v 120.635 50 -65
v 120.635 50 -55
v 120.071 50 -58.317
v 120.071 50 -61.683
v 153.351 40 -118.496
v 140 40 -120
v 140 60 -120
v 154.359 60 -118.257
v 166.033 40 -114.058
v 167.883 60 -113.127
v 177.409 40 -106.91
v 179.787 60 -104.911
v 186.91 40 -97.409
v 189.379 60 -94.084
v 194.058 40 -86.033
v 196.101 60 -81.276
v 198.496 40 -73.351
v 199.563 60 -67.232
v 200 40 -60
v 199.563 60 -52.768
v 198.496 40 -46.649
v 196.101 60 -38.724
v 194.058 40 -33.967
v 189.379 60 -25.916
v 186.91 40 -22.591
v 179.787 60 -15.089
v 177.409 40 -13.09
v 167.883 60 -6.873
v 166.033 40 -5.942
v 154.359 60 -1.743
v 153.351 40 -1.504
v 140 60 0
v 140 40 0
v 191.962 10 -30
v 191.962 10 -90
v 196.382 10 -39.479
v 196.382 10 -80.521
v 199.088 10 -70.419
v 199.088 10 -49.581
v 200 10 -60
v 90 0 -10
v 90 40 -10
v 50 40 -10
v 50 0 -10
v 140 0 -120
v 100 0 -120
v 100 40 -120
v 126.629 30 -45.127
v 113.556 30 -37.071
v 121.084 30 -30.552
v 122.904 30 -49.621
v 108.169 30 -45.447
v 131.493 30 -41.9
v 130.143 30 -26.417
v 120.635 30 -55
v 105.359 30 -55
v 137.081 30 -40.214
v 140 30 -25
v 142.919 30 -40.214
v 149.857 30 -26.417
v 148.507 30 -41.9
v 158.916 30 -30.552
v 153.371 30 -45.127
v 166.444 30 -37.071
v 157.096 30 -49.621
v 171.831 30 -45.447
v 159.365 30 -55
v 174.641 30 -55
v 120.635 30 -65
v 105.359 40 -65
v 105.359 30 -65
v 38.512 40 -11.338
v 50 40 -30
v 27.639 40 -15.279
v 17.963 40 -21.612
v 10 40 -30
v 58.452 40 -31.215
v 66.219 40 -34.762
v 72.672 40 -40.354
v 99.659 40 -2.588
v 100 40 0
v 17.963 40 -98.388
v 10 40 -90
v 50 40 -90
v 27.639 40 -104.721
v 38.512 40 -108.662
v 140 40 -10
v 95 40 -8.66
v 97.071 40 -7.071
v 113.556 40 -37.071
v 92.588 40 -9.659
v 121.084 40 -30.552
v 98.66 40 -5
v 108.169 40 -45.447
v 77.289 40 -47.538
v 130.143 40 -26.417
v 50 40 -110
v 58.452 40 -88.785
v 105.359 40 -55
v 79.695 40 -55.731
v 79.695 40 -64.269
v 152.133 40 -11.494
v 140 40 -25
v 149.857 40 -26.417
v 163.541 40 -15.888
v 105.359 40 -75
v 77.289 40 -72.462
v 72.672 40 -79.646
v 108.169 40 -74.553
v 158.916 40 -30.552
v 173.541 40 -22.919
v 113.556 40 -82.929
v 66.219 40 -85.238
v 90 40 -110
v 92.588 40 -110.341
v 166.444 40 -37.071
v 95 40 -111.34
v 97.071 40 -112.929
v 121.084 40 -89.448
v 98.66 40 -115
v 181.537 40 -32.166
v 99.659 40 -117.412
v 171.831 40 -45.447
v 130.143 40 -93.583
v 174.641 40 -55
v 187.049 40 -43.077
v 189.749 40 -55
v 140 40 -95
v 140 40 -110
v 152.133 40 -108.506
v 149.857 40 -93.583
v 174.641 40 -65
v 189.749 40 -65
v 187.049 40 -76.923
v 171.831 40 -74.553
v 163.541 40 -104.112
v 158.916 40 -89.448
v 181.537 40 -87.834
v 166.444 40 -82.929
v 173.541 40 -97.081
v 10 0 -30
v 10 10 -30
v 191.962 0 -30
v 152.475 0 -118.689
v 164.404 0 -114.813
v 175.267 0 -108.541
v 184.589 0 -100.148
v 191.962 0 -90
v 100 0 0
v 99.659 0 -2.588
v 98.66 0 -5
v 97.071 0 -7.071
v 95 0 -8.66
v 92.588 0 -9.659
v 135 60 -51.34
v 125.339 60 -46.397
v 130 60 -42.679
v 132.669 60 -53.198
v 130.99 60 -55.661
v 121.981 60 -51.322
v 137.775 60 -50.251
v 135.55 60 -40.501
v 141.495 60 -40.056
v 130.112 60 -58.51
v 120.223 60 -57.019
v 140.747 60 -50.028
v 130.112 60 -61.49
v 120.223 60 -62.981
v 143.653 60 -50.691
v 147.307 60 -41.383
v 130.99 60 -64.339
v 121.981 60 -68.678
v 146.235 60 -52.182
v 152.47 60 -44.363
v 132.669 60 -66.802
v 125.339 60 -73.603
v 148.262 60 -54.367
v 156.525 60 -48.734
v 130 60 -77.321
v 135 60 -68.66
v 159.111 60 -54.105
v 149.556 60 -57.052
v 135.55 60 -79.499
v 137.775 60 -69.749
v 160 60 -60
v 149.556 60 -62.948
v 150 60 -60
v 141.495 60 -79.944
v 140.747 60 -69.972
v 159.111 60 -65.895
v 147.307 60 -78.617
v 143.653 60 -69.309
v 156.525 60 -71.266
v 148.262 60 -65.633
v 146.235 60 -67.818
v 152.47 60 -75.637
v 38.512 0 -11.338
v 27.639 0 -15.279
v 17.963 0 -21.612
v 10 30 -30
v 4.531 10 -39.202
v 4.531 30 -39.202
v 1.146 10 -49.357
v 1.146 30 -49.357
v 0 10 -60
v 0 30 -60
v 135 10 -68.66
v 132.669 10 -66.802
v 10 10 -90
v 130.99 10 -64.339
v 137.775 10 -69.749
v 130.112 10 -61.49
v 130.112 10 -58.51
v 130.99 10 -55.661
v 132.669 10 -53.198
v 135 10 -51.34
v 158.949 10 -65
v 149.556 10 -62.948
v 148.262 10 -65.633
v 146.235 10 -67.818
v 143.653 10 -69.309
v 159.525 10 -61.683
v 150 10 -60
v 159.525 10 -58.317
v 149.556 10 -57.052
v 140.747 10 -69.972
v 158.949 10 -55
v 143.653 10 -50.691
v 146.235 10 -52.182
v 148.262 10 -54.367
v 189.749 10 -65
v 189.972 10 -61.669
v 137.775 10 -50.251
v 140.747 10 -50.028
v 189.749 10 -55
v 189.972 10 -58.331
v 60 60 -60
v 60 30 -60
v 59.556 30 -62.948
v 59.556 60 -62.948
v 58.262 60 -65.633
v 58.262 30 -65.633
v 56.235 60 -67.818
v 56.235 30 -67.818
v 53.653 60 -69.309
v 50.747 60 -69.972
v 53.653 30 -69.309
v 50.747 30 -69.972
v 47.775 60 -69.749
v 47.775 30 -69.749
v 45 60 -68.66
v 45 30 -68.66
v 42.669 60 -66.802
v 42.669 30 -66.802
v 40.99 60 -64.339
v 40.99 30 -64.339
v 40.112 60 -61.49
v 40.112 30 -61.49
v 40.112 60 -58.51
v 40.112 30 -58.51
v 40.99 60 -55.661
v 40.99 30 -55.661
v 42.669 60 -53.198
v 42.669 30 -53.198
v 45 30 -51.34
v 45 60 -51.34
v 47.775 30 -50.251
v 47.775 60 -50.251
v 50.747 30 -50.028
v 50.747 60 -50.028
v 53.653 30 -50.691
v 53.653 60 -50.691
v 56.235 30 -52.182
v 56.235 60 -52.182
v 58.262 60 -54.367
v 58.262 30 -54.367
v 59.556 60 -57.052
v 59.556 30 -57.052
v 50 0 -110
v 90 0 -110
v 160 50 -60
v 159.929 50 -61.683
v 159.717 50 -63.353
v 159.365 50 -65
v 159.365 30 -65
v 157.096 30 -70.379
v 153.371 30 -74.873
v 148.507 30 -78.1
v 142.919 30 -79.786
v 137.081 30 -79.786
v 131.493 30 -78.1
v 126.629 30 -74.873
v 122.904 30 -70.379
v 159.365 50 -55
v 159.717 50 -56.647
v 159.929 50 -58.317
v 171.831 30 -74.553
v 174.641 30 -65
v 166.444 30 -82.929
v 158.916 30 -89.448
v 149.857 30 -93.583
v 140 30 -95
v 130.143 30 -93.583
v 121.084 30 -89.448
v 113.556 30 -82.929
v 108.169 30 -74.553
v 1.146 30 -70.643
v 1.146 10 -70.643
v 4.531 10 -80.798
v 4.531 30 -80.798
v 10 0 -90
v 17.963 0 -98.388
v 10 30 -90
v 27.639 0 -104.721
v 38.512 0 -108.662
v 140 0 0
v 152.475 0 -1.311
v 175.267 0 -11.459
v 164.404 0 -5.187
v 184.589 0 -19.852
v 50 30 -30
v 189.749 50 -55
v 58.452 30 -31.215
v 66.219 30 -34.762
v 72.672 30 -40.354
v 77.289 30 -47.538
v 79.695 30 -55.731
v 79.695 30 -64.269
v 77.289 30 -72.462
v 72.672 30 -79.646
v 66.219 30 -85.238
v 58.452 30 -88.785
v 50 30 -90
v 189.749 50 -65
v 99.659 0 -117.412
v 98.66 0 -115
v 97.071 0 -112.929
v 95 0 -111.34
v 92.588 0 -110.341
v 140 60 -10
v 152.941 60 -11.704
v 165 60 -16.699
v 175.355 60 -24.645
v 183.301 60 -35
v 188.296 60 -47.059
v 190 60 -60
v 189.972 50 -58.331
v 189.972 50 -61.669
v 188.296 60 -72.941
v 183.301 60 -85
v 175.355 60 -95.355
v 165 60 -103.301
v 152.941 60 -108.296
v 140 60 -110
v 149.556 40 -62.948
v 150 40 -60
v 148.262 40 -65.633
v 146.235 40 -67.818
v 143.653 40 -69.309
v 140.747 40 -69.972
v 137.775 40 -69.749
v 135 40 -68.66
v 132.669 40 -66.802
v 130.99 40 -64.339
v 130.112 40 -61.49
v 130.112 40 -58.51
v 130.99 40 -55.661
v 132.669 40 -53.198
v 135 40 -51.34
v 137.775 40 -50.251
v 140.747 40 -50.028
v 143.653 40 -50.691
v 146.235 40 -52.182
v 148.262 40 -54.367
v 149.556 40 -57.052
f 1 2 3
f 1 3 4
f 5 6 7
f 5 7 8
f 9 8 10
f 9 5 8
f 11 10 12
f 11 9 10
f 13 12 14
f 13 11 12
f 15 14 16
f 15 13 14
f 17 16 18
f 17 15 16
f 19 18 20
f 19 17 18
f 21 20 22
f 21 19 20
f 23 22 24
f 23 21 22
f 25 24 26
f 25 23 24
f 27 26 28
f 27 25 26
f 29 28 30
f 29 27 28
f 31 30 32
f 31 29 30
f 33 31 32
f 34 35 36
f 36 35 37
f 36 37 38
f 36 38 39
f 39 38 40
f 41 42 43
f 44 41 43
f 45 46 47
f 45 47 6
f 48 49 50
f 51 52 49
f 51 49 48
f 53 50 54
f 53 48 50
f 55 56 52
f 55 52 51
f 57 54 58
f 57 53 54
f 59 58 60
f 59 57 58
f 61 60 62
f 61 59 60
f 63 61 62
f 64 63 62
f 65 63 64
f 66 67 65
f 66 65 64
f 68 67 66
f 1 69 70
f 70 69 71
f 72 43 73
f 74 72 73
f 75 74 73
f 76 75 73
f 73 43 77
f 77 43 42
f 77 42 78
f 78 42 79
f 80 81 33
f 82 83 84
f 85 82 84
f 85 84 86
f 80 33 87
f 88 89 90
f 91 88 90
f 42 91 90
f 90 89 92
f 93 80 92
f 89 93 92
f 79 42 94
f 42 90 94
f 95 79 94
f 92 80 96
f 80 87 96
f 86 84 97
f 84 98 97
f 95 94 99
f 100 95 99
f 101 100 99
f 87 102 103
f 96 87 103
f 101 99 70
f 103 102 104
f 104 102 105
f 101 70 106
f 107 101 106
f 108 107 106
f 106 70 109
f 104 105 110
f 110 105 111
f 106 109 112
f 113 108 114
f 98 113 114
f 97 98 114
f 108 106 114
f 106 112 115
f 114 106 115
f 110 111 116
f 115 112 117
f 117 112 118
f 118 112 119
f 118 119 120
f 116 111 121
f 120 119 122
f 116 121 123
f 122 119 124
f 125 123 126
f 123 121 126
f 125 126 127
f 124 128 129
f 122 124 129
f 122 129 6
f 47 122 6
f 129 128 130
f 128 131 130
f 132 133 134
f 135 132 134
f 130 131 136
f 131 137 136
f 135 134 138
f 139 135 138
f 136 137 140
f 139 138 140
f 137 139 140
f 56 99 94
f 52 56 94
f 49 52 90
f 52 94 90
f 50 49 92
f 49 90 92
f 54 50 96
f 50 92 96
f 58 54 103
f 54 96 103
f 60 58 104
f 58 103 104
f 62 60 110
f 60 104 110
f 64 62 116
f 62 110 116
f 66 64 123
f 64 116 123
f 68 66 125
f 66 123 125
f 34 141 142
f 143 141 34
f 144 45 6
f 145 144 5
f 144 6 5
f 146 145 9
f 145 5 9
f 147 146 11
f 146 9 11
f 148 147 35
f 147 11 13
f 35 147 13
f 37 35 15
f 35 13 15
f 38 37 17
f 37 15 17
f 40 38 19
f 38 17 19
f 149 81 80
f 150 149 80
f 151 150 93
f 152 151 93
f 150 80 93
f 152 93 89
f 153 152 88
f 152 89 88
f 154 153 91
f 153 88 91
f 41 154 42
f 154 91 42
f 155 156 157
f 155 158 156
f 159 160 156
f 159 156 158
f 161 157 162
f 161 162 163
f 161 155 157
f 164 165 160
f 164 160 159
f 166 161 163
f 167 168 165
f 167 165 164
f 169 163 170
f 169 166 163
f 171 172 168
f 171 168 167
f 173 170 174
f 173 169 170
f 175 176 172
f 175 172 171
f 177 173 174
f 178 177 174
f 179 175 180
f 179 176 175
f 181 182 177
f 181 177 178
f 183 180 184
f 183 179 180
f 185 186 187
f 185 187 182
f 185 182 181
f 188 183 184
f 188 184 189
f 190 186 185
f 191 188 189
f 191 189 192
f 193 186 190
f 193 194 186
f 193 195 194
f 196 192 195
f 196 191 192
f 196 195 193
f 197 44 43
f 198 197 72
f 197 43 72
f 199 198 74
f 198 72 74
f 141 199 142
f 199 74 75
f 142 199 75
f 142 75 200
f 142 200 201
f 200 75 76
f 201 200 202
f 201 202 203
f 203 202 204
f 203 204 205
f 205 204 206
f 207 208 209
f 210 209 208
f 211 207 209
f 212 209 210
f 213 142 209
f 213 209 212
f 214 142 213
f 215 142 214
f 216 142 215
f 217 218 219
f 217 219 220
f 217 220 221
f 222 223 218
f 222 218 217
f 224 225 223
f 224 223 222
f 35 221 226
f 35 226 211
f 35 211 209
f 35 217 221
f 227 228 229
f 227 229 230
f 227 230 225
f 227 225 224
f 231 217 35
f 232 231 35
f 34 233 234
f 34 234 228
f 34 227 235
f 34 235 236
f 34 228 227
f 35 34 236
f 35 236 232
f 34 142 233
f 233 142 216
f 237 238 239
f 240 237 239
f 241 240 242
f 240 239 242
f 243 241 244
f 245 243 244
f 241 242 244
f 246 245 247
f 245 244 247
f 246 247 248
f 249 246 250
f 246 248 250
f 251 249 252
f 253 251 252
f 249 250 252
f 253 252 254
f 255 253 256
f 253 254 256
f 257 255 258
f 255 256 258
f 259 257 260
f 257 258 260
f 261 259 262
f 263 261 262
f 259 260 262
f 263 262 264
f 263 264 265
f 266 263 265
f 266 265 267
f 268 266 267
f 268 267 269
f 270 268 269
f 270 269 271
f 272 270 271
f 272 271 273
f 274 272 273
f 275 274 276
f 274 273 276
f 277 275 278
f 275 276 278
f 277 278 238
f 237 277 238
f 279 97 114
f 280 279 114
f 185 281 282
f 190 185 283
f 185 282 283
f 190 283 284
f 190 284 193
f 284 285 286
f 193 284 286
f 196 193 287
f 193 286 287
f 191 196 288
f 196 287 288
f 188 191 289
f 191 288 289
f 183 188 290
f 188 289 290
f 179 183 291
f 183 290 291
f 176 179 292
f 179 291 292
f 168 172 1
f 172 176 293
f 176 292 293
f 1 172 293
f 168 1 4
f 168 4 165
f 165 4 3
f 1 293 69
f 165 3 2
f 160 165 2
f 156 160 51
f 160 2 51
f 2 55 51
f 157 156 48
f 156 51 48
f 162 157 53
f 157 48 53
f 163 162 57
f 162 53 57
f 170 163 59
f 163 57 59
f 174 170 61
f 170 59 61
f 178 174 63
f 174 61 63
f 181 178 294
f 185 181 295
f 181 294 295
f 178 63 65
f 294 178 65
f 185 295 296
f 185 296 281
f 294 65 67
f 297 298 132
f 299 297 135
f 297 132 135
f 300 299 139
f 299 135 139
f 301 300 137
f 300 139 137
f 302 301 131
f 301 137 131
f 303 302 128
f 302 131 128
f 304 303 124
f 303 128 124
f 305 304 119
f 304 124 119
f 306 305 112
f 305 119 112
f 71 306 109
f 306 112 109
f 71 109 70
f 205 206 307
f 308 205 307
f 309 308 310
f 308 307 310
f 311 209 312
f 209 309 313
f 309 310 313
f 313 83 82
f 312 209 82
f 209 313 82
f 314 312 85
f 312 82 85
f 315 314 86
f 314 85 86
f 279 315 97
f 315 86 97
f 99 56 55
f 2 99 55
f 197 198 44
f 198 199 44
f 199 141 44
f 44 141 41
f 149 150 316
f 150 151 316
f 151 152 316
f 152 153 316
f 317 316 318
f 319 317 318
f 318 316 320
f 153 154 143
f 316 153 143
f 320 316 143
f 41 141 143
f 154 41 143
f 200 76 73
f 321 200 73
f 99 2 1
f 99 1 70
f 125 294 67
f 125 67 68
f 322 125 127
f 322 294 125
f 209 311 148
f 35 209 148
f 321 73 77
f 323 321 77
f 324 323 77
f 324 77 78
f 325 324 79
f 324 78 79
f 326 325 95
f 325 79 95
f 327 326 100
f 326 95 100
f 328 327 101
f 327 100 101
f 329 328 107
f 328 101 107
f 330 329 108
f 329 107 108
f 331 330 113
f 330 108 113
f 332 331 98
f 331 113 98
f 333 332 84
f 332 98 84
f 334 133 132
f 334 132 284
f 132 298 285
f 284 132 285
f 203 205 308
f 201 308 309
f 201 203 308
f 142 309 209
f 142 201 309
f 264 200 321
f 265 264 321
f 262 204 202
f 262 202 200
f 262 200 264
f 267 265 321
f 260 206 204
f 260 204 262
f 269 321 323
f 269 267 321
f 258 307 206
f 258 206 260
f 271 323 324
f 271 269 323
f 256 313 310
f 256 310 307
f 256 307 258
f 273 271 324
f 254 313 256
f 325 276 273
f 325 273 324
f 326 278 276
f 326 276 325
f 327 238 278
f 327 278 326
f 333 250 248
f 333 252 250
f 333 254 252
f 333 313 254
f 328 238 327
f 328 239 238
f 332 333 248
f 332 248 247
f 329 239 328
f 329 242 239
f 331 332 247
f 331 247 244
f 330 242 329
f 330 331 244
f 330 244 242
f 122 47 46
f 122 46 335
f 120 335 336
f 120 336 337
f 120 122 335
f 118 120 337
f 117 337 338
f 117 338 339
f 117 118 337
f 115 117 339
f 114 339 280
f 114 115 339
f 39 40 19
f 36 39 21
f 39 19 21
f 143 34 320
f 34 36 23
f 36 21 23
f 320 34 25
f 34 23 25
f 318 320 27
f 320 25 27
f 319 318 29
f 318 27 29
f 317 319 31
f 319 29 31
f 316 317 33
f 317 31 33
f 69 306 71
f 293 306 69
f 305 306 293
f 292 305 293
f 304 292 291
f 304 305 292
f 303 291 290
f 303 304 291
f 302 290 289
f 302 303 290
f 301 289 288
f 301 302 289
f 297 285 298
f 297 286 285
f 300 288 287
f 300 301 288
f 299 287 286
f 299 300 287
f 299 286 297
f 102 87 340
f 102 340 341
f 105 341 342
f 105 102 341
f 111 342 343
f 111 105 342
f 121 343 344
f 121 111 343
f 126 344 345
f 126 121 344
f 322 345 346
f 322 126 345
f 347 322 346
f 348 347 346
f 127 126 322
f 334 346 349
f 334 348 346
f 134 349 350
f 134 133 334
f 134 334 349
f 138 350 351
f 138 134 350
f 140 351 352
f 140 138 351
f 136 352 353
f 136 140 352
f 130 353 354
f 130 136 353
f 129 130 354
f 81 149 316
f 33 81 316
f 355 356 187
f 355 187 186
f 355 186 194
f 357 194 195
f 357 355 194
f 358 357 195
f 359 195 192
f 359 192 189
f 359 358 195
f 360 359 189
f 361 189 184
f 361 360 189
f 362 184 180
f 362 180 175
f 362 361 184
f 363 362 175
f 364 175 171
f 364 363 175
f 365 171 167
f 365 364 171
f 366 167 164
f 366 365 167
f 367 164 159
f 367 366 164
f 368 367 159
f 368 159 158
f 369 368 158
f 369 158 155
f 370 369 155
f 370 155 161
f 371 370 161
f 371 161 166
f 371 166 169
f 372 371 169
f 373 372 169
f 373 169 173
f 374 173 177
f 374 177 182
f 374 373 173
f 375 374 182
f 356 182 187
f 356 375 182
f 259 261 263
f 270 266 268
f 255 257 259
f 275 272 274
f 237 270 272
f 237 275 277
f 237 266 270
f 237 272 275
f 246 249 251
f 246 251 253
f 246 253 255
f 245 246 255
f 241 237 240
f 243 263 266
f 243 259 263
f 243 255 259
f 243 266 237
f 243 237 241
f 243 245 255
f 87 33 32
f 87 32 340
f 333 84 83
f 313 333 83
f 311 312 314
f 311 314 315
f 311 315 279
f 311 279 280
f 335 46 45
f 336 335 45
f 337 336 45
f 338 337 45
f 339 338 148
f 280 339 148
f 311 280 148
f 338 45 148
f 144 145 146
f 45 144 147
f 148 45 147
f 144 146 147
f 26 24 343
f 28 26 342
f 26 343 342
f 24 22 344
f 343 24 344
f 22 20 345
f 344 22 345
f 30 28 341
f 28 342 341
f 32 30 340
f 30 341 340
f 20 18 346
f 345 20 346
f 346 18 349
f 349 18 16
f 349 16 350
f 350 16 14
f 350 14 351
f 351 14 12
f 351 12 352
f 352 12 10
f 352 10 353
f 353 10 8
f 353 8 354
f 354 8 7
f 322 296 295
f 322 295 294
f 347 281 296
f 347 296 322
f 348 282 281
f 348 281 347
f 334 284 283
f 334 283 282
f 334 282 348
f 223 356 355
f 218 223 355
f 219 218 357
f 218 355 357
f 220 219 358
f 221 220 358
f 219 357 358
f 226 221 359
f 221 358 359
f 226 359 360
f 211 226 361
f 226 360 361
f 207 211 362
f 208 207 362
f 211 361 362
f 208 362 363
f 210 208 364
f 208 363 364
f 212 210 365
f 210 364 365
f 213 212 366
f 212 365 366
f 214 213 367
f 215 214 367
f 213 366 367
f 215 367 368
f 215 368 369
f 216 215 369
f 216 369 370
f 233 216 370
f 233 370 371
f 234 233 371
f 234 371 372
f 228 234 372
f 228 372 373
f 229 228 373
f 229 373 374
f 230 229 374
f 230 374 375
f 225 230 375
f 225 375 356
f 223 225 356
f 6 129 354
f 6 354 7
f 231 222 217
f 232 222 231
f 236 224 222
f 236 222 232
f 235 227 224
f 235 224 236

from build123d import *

# Parameters (mm, degrees)
SKETCH1_W                 = 200
SKETCH1_H                 = 120
BOSS_EXTRUDE1_DEPTH       = 40
CUT_EXTRUDE2_DEPTH        = 40
CUT_EXTRUDE3_DEPTH        = 40
CUT_EXTRUDE4_DEPTH        = 40
SKETCH5_W                 = 208.7299617
SKETCH5_H                 = 60
CUT_EXTRUDE5_DEPTH        = 10
CUT_EXTRUDE6_DEPTH        = 116
BOSS_EXTRUDE2_DEPTH       = 20
CUT_EXTRUDE7_DEPTH        = 10
SKETCH9_R                 = 10
BOSS_EXTRUDE3_DEPTH       = 30
SKETCH10_R                = 10
CUT_EXTRUDE8_DEPTH        = 69
SKETCH11_R                = 20
SKETCH11_R_2              = 10
BOSS_EXTRUDE4_DEPTH       = 20
SKETCH12_R                = 35
SKETCH12_R_2              = 20
CUT_EXTRUDE9_DEPTH        = 10
BOSS_EXTRUDE10_DEPTH      = 10
BOSS_EXTRUDE10_DEPTH_BACK = 36
BOSS_EXTRUDE11_DEPTH      = 20
CUT_EXTRUDE10_DEPTH       = 20
SKETCH17_W                = 10
SKETCH17_H                = 10
CUT_EXTRUDE11_DEPTH       = 20
SKETCH18_W                = 181.961524227
SKETCH18_H                = 60
CUT_EXTRUDE12_DEPTH       = 20


with BuildPart() as part:
    # Sketch1 → Boss-Extrude1 (new body)
    with BuildSketch(Plane(origin=(0, 0, 0), x_dir=(1, 0, 0), z_dir=(0, 1, 0))):
        with Locations((100, 60)):
            Rectangle(SKETCH1_W, SKETCH1_H)
    extrude(amount=BOSS_EXTRUDE1_DEPTH)

    # Sketch2 → Cut-Extrude2 (cut)
    with BuildSketch(Plane(origin=(0, 40, 0), x_dir=(1, 0, 0), z_dir=(0, 1, 0))):
        Polygon((0, 110), (50, 110), (90, 110), (90, 120), (0, 120), align=None)
        with BuildLine():
            ThreePointArc((0, 60), (14.644660941, 95.355339059), (50, 110))
            Line((50, 110), (0, 110))
            Line((0, 110), (0, 60))
        make_face()
        with BuildLine():
            ThreePointArc((50, 10), (14.644660941, 24.644660941), (0, 60))
            Line((0, 60), (0, 0))
            Line((0, 0), (90, 0))
            Line((90, 0), (90, 10))
            Line((90, 10), (50, 10))
        make_face()
    extrude(amount=-CUT_EXTRUDE2_DEPTH, mode=Mode.SUBTRACT)

    # Sketch3 → Cut-Extrude3 (cut)
    with BuildSketch(Plane(origin=(0, 40, 0), x_dir=(1, 0, 0), z_dir=(0, 1, 0))):
        with BuildLine():
            Line((90, 110), (90, 120))
            Line((90, 120), (100, 120))
            ThreePointArc((100, 120), (97.071067812, 112.928932188), (90, 110))
        make_face()
    extrude(amount=-CUT_EXTRUDE3_DEPTH, mode=Mode.SUBTRACT)

    # Sketch4 → Cut-Extrude4 (cut)
    with BuildSketch(Plane(origin=(0, 40, 0), x_dir=(1, 0, 0), z_dir=(0, 1, 0))):
        with BuildLine():
            Line((90, 10), (90, 0))
            Line((90, 0), (100, 0))
            ThreePointArc((100, 0), (97.071067812, 7.071067812), (90, 10))
        make_face()
    extrude(amount=-CUT_EXTRUDE4_DEPTH, mode=Mode.SUBTRACT)

    # Sketch5 → Cut-Extrude5 (cut)
    with BuildSketch(Plane.XZ):
        with Locations((95.63501915, -60)):
            Rectangle(SKETCH5_W, SKETCH5_H)
    extrude(amount=-CUT_EXTRUDE5_DEPTH, mode=Mode.SUBTRACT)

    # Sketch6 → Cut-Extrude6 (cut)
    with BuildSketch(Plane(origin=(0, 40, 0), x_dir=(1, 0, 0), z_dir=(0, 1, 0))):
        with BuildLine():
            Line((200, 120), (140, 120))
            ThreePointArc((140, 120), (182.426406871, 102.426406871), (200, 60))
            Line((200, 60), (200, 120))
        make_face()
        with BuildLine():
            Line((200, 0), (200, 60))
            ThreePointArc((200, 60), (182.426406871, 17.573593129), (140, 0))
            Line((140, 0), (200, 0))
        make_face()
    extrude(amount=-CUT_EXTRUDE6_DEPTH, mode=Mode.SUBTRACT)

    # Sketch7 → Boss-Extrude2 (add)
    with BuildSketch(Plane(origin=(0, 40, 0), x_dir=(1, 0, 0), z_dir=(0, 1, 0))):
        with BuildLine():
            Line((140, 110), (140, 120))
            ThreePointArc((140, 120), (200, 60), (140, 0))
            Line((140, 0), (140, 10))
            ThreePointArc((140, 10), (190, 60), (140, 110))
        make_face()
    extrude(amount=BOSS_EXTRUDE2_DEPTH)

    # Sketch8 → Cut-Extrude7 (cut)
    with BuildSketch(Plane(origin=(0, 40, 0), x_dir=(1, 0, 0), z_dir=(0, 1, 0))):
        with BuildLine():
            Line((50, 90), (10, 90))
            ThreePointArc((10, 90), (0, 60), (10, 30))
            Line((10, 30), (50, 30))
            ThreePointArc((50, 30), (80, 60), (50, 90))
        make_face()
    extrude(amount=-CUT_EXTRUDE7_DEPTH, mode=Mode.SUBTRACT)

    # Sketch9 → Boss-Extrude3 (add)
    with BuildSketch(Plane(origin=(0, 30, 0), x_dir=(1, 0, 0), z_dir=(0, 1, 0))):
        with Locations((50, 60)):
            Circle(SKETCH9_R)
    extrude(amount=BOSS_EXTRUDE3_DEPTH)

    # Sketch10 → Cut-Extrude8 (cut)
    with BuildSketch(Plane(origin=(0, 40, 0), x_dir=(1, 0, 0), z_dir=(0, 1, 0))):
        with Locations((140, 60)):
            Circle(SKETCH10_R)
    extrude(amount=-CUT_EXTRUDE8_DEPTH, mode=Mode.SUBTRACT)

    # Sketch11 → Boss-Extrude4 (add)
    with BuildSketch(Plane(origin=(0, 40, 0), x_dir=(1, 0, 0), z_dir=(0, 1, 0))):
        with Locations((140, 60)):
            Circle(SKETCH11_R)
        with Locations((140, 60)):
            Circle(SKETCH11_R_2, mode=Mode.SUBTRACT)
    extrude(amount=BOSS_EXTRUDE4_DEPTH)

    # Sketch12 → Cut-Extrude9 (cut)
    with BuildSketch(Plane(origin=(0, 40, 0), x_dir=(1, 0, 0), z_dir=(0, 1, 0))):
        with Locations((140, 60)):
            Circle(SKETCH12_R)
        with Locations((140, 60)):
            Circle(SKETCH12_R_2, mode=Mode.SUBTRACT)
    extrude(amount=-CUT_EXTRUDE9_DEPTH, mode=Mode.SUBTRACT)

    # Sketch14 → Boss-Extrude10 (add, two sides)
    with BuildSketch(Plane(origin=(0, 40, 0), x_dir=(1, 0, 0), z_dir=(0, 1, 0))) as boss_extrude10_sk:
        with BuildLine():
            Line((174.641016151, 65), (160, 65))
            Line((160, 65), (160, 55))
            Line((160, 55), (174.641016151, 55))
            ThreePointArc((174.641016151, 55), (174.91013868, 57.493564812), (175, 60))
            ThreePointArc((175, 60), (174.91013868, 62.506435188), (174.641016151, 65))
        make_face()
        with BuildLine():
            Line((158.948525297, 65), (160, 65))
            Line((160, 65), (160, 55))
            Line((160, 55), (158.948525297, 55))
            ThreePointArc((158.948525297, 55), (159.597107209, 60), (158.948525297, 65))
        make_face()
        with BuildLine():
            Line((189.749371855, 65), (174.641016151, 65))
            ThreePointArc((174.641016151, 65), (174.91013868, 62.506435188), (175, 60))
            ThreePointArc((175, 60), (174.91013868, 57.493564812), (174.641016151, 55))
            Line((174.641016151, 55), (189.749371855, 55))
            ThreePointArc((189.749371855, 55), (190, 60), (189.749371855, 65))
        make_face()
    extrude(amount=BOSS_EXTRUDE10_DEPTH)
    extrude(boss_extrude10_sk.sketch, amount=-BOSS_EXTRUDE10_DEPTH_BACK)

    # Sketch15 → Boss-Extrude11 (add)
    with BuildSketch(Plane(origin=(0, 30, 0), x_dir=(1, 0, 0), z_dir=(0, 1, 0))):
        with BuildLine():
            Line((120.635083269, 55), (120.635083269, 65))
            ThreePointArc((120.635083269, 65), (120, 60), (120.635083269, 55))
        make_face()
        with BuildLine():
            ThreePointArc((120.635083269, 55), (120, 60), (120.635083269, 65))
            Line((120.635083269, 65), (105.358983849, 65))
            ThreePointArc((105.358983849, 65), (105, 60), (105.358983849, 55))
            Line((105.358983849, 55), (120.635083269, 55))
        make_face()
    extrude(amount=BOSS_EXTRUDE11_DEPTH)

    # Sketch16 → Cut-Extrude10 (cut)
    with BuildSketch(Plane.XY.offset(-55)):
        Polygon((120.635083269, 50), (105.358983849, 40), (105.358983849, 50), align=None)
    extrude(amount=-CUT_EXTRUDE10_DEPTH, mode=Mode.SUBTRACT)

    # Sketch17 → Cut-Extrude11 (cut)
    with BuildSketch(Plane(origin=(105.358983849, 0, 0), x_dir=(0, 0, -1), z_dir=(1, 0, 0))):
        with Locations((60, 45)):
            Rectangle(SKETCH17_W, SKETCH17_H)
    extrude(amount=-CUT_EXTRUDE11_DEPTH, mode=Mode.SUBTRACT)

    # Sketch18 → Cut-Extrude12 (cut)
    with BuildSketch(Plane.XZ.offset(-10)):
        with Locations((100.980762114, -60)):
            Rectangle(SKETCH18_W, SKETCH18_H)
    extrude(amount=CUT_EXTRUDE12_DEPTH, mode=Mode.SUBTRACT)


solid = part.part
